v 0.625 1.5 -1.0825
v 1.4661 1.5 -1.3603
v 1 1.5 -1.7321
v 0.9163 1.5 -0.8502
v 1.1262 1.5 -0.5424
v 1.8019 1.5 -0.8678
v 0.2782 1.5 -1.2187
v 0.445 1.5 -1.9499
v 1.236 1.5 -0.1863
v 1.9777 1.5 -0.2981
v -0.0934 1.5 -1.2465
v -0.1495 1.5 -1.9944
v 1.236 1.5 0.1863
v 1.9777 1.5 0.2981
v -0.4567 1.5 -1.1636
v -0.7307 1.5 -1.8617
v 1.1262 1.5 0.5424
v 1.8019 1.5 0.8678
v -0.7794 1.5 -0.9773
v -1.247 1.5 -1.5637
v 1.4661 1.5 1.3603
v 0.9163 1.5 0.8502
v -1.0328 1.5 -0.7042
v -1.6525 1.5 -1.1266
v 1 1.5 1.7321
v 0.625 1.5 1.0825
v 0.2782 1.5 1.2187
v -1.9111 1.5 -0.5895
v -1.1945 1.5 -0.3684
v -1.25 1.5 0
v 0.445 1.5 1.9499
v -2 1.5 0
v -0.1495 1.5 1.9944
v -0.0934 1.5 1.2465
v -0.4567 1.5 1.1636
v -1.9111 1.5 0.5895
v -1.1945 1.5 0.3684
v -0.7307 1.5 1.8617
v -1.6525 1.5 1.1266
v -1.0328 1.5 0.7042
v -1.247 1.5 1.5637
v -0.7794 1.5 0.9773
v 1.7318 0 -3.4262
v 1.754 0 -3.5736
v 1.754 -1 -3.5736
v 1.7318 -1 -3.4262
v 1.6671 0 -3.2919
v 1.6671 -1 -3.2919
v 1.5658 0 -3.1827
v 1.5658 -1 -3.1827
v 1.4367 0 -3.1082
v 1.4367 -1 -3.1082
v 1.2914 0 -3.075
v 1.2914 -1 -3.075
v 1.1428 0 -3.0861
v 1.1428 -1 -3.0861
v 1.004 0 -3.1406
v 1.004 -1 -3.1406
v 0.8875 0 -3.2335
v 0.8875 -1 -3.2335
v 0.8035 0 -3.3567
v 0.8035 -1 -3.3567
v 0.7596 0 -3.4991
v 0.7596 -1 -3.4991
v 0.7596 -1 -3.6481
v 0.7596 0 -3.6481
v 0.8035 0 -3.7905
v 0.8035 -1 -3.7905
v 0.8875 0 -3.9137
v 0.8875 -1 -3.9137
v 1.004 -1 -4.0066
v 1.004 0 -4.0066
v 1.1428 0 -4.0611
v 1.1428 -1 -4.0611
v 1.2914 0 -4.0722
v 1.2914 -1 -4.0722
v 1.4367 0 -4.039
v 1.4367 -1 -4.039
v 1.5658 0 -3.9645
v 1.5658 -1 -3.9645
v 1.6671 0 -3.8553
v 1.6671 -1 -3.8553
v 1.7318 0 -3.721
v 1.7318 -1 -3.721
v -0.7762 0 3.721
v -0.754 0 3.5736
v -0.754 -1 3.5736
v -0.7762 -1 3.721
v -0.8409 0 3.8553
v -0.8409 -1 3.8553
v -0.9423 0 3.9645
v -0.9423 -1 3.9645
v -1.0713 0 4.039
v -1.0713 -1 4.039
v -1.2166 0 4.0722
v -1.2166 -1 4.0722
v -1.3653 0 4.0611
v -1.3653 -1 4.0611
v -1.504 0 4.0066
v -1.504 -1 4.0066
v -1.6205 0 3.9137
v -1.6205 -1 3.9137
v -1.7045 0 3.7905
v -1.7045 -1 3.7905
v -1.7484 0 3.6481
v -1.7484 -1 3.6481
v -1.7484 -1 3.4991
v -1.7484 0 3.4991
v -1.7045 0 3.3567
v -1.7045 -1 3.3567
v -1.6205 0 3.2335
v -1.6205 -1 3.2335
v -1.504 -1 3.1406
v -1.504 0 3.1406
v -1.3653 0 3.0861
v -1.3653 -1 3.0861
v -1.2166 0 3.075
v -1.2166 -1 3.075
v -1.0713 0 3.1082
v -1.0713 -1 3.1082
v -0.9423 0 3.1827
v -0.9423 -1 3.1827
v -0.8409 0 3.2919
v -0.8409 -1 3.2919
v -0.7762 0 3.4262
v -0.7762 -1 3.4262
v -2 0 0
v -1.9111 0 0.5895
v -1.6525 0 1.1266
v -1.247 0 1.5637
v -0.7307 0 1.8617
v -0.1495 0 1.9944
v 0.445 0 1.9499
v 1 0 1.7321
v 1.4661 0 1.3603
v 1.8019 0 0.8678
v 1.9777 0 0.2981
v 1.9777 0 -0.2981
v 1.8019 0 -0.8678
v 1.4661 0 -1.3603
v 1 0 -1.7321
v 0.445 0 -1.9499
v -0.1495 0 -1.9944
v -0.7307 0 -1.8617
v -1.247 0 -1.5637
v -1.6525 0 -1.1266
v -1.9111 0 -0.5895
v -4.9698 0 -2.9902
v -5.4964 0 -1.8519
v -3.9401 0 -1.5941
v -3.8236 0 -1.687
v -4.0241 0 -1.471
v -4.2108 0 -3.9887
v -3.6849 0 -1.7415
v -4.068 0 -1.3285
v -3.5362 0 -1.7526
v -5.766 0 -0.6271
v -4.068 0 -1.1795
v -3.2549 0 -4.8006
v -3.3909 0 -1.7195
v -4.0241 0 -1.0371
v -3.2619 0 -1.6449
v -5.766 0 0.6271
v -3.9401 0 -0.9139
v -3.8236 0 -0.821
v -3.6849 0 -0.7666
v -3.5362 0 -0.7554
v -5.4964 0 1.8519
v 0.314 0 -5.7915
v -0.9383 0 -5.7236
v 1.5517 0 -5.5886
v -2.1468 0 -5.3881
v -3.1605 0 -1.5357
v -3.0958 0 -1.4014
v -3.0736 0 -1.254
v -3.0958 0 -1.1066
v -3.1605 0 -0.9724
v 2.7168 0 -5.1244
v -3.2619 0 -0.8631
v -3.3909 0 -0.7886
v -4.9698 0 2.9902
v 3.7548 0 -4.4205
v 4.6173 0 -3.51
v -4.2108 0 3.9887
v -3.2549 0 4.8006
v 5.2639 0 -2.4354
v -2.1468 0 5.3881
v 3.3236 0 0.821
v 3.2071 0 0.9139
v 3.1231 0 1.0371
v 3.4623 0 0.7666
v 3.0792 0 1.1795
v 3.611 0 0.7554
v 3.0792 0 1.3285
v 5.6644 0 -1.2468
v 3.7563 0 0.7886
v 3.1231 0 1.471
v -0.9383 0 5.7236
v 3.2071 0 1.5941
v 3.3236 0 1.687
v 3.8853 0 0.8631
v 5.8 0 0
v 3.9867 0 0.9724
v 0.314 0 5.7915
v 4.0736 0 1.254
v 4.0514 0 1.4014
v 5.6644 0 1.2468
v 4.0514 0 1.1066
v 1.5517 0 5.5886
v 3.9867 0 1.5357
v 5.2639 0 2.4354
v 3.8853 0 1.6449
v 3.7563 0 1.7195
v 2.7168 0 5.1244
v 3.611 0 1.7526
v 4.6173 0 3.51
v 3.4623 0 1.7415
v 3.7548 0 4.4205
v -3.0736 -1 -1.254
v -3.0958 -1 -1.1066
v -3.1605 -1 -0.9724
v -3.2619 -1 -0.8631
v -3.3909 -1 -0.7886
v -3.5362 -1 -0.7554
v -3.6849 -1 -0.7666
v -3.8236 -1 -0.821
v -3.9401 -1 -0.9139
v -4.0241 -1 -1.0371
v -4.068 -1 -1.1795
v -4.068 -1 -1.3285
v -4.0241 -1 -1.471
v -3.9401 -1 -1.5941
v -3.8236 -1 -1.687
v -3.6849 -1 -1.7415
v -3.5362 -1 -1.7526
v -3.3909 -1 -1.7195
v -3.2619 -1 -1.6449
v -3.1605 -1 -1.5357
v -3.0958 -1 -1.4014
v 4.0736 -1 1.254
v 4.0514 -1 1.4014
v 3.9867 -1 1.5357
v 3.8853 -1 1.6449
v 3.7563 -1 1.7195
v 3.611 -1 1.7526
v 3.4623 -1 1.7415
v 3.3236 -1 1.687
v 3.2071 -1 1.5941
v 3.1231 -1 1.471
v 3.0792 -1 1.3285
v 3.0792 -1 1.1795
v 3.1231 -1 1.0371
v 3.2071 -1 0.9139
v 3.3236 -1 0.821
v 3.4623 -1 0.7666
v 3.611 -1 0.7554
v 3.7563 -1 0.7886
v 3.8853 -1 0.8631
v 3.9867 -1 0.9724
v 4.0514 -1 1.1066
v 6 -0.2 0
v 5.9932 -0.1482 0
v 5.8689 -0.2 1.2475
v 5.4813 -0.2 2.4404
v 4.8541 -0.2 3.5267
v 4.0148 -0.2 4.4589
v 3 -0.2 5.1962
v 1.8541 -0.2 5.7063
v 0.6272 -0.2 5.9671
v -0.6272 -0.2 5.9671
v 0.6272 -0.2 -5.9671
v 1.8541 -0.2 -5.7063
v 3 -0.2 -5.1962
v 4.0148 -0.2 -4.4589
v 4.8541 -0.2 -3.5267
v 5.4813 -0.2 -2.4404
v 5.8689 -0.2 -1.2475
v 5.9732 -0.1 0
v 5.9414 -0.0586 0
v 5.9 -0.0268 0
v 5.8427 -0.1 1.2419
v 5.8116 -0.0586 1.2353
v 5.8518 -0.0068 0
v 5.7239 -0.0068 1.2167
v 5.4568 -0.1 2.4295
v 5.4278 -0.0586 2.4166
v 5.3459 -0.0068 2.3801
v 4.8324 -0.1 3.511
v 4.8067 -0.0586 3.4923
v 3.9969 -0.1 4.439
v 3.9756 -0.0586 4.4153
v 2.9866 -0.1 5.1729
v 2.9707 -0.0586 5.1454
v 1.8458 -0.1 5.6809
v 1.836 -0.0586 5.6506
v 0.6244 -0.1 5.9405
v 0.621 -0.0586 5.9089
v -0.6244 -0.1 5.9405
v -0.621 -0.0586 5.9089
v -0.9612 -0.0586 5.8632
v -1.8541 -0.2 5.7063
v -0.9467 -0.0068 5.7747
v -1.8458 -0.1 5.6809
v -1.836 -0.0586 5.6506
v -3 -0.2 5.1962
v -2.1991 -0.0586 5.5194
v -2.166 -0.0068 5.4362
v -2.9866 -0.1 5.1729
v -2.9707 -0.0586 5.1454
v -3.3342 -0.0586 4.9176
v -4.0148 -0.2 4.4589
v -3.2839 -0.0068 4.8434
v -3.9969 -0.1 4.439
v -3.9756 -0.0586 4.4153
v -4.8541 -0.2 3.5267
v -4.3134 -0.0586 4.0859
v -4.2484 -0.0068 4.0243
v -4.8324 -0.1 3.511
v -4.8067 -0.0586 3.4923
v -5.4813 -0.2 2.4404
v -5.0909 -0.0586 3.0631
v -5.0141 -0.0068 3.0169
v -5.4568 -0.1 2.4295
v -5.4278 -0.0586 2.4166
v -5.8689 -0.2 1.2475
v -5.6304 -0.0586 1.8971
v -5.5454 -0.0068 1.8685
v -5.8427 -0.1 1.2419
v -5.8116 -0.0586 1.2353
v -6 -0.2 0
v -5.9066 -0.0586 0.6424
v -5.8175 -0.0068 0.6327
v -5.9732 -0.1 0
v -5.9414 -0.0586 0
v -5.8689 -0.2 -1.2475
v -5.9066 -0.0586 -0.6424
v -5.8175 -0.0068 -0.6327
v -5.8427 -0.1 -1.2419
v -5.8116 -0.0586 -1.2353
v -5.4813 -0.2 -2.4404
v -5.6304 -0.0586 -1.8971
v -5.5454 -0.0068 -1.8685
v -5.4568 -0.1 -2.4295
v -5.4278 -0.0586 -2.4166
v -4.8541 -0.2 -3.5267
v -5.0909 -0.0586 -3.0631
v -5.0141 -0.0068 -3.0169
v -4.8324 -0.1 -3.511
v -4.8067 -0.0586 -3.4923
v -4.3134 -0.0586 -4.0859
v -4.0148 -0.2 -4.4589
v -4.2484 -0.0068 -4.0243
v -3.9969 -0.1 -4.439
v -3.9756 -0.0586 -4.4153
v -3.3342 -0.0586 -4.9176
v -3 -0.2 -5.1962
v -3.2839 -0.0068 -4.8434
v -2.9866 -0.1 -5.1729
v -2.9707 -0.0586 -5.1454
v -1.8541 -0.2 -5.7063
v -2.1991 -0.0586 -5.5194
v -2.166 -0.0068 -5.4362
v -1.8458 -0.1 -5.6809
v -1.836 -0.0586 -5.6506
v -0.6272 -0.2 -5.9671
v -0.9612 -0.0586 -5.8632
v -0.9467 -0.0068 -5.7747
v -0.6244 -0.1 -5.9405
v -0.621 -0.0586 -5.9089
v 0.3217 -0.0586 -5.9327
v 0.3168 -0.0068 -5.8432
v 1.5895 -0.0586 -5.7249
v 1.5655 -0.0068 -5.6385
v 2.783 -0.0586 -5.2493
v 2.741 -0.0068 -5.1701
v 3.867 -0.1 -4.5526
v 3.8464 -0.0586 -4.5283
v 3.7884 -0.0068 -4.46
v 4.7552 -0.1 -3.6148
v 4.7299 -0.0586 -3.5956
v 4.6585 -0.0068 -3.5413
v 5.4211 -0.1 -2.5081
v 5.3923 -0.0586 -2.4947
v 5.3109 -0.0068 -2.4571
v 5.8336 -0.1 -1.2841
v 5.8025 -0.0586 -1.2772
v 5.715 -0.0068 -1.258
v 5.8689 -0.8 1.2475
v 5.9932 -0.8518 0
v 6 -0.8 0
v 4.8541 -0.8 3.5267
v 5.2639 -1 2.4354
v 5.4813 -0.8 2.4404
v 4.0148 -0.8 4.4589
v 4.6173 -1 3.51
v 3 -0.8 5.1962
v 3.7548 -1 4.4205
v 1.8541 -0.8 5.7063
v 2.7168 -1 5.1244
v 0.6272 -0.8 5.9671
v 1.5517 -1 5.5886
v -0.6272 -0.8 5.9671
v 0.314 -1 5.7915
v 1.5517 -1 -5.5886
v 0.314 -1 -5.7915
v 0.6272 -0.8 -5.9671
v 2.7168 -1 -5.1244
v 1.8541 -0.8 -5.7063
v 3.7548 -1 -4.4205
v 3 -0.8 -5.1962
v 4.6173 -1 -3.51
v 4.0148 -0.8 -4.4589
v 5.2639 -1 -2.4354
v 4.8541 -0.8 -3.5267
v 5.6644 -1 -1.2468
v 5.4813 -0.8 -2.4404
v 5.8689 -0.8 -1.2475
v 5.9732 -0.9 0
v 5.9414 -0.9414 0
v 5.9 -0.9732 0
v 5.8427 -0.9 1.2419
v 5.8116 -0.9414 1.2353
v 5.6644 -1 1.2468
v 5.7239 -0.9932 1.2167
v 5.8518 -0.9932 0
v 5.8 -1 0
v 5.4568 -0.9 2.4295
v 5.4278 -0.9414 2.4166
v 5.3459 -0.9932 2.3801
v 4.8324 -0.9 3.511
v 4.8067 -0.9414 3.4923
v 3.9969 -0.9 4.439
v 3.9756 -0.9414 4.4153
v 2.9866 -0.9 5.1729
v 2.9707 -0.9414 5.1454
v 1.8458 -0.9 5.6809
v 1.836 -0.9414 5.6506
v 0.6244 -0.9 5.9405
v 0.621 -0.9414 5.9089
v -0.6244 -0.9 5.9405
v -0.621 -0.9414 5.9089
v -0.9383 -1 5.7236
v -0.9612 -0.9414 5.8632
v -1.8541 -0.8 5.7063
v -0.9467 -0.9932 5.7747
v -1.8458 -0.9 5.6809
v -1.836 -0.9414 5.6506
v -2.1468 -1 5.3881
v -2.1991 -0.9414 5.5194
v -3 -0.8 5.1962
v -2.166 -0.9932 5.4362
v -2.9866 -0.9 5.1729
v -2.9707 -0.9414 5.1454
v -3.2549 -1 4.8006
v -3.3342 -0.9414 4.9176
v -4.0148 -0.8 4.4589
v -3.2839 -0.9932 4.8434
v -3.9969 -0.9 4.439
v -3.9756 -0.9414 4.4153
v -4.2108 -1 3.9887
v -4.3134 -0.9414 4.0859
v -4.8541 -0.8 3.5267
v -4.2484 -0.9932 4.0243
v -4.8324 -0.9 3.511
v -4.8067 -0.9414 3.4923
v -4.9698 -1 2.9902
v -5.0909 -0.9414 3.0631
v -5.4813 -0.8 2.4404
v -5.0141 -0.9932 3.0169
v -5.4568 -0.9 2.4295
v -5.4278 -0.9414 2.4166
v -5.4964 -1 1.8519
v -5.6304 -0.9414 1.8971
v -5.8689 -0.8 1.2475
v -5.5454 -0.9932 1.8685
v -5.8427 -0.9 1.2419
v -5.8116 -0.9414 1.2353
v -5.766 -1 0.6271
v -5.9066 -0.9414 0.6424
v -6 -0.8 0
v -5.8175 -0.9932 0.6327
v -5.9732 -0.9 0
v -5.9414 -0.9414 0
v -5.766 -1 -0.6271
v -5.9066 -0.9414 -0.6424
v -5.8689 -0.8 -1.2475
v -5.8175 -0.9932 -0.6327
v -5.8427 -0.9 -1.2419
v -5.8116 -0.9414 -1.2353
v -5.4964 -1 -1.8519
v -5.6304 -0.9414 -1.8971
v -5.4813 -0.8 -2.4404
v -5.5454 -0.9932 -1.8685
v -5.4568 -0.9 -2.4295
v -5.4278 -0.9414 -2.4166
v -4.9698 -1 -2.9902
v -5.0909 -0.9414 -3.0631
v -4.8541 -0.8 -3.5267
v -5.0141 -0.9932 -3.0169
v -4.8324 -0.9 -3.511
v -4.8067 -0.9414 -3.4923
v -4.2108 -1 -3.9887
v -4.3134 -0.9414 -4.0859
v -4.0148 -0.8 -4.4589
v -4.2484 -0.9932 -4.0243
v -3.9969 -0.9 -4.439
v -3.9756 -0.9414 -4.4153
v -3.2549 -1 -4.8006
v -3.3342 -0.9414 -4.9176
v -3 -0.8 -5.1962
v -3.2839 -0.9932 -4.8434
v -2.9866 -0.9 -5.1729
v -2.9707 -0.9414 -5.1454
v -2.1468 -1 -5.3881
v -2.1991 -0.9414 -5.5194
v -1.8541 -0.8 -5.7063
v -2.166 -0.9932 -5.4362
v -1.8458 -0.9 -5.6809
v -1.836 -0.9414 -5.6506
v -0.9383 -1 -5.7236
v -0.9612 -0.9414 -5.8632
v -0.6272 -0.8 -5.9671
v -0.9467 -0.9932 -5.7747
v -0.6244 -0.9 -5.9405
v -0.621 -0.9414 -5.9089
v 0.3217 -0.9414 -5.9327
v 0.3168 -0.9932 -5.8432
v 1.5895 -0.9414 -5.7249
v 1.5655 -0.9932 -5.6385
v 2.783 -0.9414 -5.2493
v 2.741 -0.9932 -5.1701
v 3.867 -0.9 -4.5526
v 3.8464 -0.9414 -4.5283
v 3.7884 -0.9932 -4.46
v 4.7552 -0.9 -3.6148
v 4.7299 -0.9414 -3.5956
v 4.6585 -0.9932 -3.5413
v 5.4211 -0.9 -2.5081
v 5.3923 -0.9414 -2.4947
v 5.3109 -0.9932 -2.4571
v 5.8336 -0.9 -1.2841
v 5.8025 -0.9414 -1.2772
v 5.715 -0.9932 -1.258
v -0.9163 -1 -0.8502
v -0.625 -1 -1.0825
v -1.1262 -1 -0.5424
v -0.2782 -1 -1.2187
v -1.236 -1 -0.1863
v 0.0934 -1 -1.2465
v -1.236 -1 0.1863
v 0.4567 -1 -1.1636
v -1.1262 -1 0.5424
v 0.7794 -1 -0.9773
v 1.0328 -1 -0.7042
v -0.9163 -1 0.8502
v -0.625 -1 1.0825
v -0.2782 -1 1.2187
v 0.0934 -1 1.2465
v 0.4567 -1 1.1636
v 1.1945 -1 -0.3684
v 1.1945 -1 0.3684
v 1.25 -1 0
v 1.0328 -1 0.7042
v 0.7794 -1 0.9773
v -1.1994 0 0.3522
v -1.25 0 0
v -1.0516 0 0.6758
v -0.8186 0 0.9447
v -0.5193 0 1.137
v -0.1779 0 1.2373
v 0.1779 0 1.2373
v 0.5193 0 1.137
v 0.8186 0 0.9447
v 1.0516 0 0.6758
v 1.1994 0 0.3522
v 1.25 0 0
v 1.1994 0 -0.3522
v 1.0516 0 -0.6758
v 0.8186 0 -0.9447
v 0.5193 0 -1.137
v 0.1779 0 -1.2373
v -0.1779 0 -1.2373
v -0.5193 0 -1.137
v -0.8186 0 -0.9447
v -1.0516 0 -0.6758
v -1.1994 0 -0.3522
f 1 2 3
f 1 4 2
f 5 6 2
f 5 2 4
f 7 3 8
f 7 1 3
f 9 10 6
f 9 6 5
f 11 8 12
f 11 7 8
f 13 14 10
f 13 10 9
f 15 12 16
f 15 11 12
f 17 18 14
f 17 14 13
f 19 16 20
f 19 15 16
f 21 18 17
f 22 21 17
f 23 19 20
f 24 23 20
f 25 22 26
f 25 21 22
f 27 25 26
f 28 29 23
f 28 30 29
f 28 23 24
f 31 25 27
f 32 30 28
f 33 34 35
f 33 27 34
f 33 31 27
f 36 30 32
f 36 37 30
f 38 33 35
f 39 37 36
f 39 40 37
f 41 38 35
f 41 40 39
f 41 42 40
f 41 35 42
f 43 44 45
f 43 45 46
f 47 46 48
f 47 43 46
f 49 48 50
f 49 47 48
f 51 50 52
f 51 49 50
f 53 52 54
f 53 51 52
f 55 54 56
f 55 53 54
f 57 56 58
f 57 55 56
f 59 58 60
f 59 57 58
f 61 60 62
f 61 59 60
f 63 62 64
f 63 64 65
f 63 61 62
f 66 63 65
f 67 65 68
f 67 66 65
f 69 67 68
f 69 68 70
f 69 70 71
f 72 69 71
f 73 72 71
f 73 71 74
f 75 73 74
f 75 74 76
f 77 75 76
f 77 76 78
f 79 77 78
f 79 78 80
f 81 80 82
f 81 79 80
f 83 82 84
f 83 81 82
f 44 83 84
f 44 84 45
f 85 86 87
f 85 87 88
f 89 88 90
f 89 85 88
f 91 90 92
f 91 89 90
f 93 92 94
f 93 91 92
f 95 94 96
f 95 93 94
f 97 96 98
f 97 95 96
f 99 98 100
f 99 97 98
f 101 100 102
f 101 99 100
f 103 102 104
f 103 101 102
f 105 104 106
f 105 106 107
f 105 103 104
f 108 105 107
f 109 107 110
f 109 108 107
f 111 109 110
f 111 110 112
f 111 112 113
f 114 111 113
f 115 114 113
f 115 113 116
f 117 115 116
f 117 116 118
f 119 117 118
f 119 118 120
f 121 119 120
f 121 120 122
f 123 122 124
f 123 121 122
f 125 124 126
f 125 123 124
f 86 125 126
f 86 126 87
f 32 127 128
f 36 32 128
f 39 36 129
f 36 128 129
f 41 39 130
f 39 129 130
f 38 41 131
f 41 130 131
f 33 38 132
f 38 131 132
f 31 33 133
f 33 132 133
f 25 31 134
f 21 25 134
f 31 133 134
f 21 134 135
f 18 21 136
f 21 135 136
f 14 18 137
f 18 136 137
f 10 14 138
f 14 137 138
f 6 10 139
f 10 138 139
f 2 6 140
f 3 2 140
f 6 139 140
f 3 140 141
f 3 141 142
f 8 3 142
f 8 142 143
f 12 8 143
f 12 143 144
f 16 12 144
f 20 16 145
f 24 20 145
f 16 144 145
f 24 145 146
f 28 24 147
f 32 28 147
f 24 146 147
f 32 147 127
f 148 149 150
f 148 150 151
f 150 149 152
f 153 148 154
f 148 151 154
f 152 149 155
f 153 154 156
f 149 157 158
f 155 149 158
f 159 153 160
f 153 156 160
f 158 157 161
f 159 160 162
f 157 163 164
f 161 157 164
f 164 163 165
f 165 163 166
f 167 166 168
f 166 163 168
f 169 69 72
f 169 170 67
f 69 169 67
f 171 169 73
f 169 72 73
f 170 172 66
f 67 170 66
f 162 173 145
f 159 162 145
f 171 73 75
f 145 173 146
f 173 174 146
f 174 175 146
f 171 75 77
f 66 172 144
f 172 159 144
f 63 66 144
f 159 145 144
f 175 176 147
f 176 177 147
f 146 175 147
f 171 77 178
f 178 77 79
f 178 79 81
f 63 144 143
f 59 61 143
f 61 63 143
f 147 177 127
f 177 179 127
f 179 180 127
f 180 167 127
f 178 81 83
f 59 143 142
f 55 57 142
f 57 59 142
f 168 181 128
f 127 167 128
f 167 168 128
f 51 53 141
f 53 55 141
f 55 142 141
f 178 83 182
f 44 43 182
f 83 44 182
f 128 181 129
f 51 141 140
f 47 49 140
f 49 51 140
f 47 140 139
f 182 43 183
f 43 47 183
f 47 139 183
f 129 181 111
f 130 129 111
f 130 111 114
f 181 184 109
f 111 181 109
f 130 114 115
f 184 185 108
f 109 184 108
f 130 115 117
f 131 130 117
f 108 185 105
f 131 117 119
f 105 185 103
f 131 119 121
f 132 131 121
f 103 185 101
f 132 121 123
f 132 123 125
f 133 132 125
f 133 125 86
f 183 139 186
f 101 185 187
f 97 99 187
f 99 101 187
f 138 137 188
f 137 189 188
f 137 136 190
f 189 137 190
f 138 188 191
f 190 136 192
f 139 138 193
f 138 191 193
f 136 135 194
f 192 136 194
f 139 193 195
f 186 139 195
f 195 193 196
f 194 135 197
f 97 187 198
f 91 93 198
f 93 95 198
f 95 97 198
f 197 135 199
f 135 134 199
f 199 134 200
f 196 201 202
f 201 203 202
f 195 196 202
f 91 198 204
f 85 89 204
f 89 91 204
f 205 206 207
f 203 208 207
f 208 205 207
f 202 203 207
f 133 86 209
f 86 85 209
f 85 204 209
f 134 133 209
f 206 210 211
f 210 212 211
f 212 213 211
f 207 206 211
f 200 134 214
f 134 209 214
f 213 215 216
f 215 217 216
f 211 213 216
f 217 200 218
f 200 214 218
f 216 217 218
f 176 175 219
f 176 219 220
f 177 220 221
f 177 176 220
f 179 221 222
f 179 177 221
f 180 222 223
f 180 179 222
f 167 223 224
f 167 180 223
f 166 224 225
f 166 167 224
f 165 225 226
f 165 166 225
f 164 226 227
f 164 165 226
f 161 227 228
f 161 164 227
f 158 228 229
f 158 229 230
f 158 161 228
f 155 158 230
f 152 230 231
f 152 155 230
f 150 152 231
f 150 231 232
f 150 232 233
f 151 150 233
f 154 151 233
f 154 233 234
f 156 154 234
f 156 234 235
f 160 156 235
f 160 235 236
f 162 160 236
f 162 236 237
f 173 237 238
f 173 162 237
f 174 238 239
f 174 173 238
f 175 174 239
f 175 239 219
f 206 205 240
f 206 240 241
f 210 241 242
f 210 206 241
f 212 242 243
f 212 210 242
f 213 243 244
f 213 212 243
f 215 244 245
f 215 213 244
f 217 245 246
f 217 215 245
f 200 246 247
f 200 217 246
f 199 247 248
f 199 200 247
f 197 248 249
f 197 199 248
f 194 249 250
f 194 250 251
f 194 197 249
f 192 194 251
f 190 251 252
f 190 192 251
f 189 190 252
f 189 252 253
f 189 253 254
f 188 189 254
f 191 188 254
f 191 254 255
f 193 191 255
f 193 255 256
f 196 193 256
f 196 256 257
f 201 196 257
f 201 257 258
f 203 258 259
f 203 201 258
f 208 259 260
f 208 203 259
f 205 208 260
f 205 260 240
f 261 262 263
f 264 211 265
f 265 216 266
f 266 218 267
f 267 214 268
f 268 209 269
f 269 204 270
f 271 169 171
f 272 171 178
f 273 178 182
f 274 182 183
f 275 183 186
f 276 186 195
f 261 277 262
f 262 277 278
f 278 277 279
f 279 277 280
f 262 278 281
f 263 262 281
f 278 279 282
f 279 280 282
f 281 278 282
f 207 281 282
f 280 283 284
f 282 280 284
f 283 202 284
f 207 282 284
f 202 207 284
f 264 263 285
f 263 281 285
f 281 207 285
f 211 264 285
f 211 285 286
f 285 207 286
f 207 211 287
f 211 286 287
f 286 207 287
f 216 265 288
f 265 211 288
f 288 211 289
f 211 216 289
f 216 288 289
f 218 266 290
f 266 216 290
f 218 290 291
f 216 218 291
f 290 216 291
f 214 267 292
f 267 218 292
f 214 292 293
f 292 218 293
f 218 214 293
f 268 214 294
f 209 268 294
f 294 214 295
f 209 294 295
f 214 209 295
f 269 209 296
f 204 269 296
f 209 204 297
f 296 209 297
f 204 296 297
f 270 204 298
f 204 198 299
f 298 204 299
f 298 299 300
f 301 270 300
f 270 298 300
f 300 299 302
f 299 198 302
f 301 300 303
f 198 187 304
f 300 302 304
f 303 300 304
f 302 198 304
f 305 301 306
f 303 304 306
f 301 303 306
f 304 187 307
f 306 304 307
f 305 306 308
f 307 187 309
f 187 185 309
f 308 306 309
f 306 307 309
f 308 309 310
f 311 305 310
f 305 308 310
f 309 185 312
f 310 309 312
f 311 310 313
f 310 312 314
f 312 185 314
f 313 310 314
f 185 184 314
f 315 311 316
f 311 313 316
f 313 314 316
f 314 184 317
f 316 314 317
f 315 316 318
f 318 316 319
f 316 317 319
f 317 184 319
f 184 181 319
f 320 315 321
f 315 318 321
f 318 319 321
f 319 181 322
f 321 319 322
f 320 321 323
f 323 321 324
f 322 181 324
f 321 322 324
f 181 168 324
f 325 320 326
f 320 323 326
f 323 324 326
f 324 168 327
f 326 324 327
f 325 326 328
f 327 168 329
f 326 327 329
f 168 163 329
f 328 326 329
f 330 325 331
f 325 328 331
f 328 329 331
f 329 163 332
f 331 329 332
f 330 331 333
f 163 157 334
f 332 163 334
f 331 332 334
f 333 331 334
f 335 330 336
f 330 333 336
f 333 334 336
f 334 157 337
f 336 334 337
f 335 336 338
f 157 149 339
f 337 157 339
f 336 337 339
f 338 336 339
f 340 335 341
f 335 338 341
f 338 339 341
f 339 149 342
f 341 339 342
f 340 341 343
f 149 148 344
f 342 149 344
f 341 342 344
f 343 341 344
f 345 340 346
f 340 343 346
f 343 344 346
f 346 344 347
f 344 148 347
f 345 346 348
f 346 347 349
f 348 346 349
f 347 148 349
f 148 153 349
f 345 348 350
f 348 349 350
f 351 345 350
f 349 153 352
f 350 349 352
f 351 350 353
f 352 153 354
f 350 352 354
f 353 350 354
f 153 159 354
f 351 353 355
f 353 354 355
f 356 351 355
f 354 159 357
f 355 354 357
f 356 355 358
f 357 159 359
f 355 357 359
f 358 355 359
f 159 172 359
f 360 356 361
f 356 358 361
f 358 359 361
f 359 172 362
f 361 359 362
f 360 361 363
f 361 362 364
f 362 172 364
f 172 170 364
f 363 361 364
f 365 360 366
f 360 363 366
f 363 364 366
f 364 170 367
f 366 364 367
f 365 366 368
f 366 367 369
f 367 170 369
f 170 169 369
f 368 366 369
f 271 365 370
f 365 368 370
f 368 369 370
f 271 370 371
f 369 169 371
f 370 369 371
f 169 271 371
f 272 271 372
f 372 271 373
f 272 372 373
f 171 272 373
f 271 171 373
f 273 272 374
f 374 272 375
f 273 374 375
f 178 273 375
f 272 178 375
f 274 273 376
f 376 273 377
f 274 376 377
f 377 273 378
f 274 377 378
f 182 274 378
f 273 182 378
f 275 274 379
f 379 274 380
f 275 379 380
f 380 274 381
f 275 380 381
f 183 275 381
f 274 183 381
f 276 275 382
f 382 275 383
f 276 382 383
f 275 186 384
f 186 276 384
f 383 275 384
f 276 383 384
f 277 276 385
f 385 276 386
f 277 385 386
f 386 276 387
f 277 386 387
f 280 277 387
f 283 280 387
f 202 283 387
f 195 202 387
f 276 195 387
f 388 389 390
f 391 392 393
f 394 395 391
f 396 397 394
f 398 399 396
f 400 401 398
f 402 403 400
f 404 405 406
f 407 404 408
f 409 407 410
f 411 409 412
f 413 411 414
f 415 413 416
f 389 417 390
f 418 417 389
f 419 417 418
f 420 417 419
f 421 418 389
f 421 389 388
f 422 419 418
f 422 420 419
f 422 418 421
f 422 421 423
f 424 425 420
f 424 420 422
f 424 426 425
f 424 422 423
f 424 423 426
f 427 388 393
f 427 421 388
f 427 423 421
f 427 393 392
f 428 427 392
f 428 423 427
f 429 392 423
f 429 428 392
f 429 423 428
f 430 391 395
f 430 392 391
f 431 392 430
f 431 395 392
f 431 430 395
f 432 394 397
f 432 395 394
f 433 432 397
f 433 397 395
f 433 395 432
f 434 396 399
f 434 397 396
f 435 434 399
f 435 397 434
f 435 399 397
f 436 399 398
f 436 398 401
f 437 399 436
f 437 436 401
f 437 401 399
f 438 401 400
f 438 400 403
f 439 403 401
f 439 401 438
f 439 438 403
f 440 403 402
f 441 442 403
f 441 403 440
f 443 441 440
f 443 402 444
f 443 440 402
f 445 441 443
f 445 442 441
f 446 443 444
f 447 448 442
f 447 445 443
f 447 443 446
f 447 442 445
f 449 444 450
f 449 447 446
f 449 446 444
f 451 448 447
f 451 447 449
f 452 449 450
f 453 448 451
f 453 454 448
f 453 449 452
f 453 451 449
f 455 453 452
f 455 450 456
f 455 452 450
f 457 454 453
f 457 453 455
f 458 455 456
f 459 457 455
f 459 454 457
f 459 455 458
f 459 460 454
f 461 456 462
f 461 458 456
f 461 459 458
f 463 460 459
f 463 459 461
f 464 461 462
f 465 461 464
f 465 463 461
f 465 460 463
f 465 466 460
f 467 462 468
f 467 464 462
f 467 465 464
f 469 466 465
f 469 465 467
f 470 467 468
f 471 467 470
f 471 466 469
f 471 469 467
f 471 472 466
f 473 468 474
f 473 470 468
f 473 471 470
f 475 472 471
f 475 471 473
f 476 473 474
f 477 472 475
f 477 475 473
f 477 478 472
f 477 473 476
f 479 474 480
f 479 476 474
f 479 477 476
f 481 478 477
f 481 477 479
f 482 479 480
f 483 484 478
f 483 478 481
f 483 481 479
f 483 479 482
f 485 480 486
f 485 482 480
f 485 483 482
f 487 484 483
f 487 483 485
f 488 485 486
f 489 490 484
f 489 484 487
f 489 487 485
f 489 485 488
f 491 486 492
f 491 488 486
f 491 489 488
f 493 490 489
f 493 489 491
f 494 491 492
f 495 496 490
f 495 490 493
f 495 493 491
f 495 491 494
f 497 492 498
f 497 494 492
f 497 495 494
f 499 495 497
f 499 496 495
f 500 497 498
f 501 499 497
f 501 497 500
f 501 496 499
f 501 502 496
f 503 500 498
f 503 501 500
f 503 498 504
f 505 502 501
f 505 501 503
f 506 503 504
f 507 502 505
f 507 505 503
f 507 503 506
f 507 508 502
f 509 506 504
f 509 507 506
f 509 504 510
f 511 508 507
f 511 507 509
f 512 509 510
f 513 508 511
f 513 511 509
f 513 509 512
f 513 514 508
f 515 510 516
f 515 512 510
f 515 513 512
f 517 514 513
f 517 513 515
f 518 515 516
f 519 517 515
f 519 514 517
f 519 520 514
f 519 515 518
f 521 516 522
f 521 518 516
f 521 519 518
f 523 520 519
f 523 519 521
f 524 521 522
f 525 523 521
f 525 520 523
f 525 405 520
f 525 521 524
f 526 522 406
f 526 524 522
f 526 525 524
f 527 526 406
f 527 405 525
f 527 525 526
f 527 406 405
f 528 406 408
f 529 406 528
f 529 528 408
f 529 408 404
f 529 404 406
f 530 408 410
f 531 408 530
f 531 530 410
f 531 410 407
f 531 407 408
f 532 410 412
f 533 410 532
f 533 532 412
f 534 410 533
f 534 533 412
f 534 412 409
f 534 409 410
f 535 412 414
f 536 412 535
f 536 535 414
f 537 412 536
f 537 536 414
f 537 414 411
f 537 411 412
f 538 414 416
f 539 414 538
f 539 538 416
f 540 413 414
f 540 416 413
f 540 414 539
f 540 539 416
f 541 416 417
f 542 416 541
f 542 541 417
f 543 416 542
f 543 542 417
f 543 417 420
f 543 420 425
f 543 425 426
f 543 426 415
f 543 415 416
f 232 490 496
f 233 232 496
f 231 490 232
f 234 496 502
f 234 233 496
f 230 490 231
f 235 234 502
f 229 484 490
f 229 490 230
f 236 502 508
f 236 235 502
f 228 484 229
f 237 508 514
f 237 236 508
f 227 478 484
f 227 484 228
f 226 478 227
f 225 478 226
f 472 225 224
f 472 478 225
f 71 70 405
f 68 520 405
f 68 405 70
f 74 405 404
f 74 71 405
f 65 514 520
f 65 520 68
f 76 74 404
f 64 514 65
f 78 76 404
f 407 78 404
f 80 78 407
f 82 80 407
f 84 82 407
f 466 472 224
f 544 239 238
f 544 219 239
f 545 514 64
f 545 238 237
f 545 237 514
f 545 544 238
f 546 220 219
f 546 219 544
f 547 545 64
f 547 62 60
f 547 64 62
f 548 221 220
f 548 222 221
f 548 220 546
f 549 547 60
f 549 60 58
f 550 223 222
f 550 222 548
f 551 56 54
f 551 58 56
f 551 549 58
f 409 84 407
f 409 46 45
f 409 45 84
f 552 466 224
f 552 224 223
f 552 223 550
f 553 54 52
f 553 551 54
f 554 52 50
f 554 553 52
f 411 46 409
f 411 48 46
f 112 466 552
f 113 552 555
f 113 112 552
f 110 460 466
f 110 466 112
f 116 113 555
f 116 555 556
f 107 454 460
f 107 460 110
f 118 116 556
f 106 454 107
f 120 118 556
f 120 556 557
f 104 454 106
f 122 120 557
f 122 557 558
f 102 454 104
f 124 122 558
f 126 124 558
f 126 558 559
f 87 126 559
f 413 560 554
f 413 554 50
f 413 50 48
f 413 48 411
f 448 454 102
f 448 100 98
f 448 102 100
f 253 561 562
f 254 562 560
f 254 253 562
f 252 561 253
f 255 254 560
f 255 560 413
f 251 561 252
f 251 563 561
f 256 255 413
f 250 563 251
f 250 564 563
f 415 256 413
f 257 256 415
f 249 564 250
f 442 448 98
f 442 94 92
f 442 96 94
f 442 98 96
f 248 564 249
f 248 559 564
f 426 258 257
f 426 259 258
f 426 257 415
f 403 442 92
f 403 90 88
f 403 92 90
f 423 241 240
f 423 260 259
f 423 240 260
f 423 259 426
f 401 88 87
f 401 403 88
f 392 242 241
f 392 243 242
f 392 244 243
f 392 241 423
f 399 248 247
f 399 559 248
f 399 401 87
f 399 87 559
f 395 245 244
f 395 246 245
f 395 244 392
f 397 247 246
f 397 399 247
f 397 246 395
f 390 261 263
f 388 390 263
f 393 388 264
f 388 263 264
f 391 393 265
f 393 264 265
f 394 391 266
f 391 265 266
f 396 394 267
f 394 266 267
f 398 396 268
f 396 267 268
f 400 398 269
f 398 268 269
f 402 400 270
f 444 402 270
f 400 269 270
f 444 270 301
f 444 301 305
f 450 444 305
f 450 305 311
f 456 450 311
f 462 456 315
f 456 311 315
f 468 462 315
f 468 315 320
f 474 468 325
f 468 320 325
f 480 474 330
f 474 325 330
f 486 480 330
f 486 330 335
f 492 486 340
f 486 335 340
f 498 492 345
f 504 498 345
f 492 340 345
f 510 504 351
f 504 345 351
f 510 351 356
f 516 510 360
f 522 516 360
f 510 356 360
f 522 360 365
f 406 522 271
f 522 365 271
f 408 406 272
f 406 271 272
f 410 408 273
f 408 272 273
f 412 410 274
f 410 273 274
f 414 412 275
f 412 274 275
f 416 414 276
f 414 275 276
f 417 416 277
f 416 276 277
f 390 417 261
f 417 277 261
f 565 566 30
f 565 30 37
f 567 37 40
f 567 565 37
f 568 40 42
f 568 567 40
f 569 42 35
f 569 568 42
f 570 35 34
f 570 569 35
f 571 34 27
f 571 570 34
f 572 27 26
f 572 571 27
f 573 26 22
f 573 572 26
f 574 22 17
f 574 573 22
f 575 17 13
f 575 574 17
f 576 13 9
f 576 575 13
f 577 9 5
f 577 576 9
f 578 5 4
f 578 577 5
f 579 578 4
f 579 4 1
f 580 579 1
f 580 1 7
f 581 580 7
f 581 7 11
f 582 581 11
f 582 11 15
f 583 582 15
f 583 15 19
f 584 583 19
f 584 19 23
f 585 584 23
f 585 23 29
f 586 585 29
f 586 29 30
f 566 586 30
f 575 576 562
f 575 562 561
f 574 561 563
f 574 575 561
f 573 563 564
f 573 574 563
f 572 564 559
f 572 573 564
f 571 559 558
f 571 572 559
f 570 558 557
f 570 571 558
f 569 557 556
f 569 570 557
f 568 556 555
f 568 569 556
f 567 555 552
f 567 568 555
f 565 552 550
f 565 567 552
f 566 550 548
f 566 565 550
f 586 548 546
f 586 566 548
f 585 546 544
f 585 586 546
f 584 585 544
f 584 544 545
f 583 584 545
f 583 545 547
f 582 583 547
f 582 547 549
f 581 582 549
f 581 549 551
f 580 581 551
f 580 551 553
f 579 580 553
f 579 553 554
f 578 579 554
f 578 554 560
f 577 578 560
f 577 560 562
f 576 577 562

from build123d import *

# Parameters (mm, degrees)
F0_R     = 6
F0_R_2   = 0.5
F0_R_3   = 1.25
F1_DEPTH = 1
F2_R     = 0.2
F3_R     = 2
F3_R_2   = 1.25
F4_DEPTH = 1.5


with BuildPart() as f1:
    # F0 (on Front) → F1 (new body)
    with BuildSketch(Plane.XZ):
        Circle(F0_R)
        with Locations((-3.573598, -1.254015)):
            Circle(F0_R_2, mode=Mode.SUBTRACT)
        with Locations((1.254015, -3.573598)):
            Circle(F0_R_2, mode=Mode.SUBTRACT)
        with Locations((-1.254015, 3.573598)):
            Circle(F0_R_2, mode=Mode.SUBTRACT)
        Circle(F0_R_3, mode=Mode.SUBTRACT)
        with Locations((3.573598, 1.254015)):
            Circle(F0_R_2, mode=Mode.SUBTRACT)
    extrude(amount=F1_DEPTH)

    # F2
    f2_edges = [f1.edges().sort_by_distance(p)[0] for p in [
        (-6, 0, 0),
        (-6, -1, 0),
    ]]
    fillet(f2_edges, radius=F2_R)

    # F3 (on face) → F4 (join)
    with BuildSketch(Plane(origin=(0, 0, 0), x_dir=(-1, 0, 0), z_dir=(0, 1, 0))):
        Circle(F3_R)
        Circle(F3_R_2, mode=Mode.SUBTRACT)
    extrude(amount=F4_DEPTH)


solid = f1.part
